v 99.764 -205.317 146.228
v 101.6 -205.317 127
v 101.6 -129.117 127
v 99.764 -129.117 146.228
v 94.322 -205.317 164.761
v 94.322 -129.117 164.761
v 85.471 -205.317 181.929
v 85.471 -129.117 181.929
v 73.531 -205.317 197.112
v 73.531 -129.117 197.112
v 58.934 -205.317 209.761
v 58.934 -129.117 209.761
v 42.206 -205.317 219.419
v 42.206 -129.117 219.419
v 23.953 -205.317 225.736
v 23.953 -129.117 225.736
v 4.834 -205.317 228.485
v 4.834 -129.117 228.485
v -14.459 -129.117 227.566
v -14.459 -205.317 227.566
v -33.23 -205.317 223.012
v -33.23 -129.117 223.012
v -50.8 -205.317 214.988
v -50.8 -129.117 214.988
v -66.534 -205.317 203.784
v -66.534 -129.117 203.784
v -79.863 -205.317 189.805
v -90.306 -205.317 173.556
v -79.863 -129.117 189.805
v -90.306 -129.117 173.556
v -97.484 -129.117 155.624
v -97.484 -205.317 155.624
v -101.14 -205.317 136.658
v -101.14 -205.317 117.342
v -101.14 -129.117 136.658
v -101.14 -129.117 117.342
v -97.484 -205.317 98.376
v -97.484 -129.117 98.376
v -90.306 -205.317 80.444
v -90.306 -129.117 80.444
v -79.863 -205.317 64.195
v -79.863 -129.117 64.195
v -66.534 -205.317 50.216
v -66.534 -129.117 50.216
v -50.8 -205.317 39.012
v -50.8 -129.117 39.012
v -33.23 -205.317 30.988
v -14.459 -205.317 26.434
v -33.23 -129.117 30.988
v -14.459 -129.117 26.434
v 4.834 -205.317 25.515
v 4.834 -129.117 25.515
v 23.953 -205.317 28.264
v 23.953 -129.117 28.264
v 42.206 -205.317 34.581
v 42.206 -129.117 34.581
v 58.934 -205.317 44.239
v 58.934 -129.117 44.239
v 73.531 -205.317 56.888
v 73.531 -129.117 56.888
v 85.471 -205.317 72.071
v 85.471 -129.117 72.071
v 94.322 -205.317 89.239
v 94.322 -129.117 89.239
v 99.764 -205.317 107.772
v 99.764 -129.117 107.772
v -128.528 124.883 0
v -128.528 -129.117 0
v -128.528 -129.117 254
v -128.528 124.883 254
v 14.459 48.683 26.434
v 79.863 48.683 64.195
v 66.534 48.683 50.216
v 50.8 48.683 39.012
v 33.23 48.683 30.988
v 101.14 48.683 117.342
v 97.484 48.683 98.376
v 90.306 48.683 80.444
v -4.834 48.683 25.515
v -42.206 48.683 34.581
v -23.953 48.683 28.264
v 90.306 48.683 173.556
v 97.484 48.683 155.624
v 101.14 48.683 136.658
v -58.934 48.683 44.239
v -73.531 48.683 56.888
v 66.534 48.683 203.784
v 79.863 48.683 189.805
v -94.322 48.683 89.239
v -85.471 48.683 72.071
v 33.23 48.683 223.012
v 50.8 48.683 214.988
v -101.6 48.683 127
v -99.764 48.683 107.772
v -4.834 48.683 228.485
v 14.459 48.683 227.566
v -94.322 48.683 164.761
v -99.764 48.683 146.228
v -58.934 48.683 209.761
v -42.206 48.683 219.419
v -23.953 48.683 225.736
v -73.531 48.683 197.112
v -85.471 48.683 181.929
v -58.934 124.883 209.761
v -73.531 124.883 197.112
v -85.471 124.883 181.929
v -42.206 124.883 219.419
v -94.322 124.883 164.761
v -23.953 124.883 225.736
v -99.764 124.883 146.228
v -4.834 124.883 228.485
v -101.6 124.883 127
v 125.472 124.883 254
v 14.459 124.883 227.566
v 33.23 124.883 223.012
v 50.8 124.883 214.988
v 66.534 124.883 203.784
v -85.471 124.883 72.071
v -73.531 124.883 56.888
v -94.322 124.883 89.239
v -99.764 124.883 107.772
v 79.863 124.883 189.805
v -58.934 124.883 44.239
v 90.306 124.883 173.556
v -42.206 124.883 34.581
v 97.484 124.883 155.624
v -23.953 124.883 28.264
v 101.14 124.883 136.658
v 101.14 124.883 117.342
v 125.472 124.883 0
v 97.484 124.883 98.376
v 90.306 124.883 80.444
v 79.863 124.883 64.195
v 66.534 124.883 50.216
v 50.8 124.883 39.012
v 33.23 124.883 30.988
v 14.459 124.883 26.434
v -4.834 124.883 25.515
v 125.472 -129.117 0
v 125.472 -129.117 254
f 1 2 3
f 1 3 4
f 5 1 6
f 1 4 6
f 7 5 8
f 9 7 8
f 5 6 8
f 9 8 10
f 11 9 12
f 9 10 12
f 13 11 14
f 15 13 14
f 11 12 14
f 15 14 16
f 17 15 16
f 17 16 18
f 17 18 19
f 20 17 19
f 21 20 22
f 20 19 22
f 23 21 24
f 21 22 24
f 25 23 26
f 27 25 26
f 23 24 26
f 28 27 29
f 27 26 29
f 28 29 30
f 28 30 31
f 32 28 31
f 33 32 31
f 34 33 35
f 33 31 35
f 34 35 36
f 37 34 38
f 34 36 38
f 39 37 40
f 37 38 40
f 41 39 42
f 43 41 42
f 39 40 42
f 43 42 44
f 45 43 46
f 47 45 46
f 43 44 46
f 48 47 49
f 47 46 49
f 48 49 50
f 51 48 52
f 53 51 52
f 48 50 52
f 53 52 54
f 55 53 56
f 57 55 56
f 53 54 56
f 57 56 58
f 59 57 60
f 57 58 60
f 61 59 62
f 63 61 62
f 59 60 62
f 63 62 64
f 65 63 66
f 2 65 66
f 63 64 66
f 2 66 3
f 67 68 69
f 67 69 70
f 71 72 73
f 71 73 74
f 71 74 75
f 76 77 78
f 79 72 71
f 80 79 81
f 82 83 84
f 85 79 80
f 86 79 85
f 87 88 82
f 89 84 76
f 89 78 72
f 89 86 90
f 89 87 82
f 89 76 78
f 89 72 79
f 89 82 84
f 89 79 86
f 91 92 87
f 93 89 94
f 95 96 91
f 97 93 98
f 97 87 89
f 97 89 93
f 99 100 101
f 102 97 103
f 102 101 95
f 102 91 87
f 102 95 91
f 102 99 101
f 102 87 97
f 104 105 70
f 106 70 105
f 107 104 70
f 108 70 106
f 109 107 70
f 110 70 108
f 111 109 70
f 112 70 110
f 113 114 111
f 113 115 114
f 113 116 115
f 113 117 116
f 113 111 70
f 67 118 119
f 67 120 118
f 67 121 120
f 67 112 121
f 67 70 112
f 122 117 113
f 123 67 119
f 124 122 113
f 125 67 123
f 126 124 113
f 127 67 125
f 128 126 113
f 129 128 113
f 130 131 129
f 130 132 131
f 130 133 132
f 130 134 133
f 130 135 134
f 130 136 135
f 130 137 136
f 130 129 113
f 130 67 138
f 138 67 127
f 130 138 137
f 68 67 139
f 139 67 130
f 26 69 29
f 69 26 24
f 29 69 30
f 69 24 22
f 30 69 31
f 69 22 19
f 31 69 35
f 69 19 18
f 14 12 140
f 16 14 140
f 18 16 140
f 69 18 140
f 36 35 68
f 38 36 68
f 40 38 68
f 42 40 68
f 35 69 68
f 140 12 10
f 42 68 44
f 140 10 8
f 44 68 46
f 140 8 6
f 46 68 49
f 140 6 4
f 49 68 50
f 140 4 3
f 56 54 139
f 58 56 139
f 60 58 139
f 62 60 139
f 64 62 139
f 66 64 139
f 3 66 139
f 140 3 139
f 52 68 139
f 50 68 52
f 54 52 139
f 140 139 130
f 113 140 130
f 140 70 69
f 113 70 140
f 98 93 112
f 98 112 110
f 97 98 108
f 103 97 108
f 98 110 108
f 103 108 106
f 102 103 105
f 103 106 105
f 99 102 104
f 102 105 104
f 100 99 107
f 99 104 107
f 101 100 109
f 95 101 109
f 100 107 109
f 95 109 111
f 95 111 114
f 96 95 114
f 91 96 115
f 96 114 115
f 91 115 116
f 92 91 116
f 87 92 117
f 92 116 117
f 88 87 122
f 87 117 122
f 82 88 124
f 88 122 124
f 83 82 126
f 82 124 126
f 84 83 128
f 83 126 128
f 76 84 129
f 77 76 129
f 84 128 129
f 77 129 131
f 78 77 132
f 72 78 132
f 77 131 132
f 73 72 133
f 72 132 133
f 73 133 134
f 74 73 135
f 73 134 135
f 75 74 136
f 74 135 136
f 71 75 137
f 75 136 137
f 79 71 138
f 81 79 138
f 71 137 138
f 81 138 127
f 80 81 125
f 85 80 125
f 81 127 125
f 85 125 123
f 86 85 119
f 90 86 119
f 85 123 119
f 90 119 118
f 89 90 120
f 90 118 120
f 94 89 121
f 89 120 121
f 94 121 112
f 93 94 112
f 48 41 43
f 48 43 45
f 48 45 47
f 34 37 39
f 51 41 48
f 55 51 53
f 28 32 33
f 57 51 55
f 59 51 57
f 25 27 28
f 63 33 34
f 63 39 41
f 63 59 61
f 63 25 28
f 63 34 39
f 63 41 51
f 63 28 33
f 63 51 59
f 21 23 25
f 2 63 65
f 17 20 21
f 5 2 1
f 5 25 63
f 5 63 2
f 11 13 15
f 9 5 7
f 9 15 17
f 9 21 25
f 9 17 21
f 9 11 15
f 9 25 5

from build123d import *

# Parameters (mm, degrees)
F0_W     = 254
F0_H     = 254
F1_DEPTH = 254
F2_R     = 101.6
F3_DEPTH = 76.2
F4_R     = 101.6
F5_DEPTH = 76.2


with BuildPart() as f1:
    # F0 (on Top) → F1 (new body)
    with BuildSketch(Plane.XY):
        with Locations((-1.528222, -2.116666)):
            Rectangle(F0_W, F0_H)
    extrude(amount=F1_DEPTH)

    # F2 (on face) → F3 (join)
    with BuildSketch(Plane.XZ.offset(129.116666)):
        with Locations((0, 127)):
            Circle(F2_R)
    extrude(amount=F3_DEPTH)

    # F4 (on face) → F5 (cut)
    with BuildSketch(Plane(origin=(0, 124.883334, 0), x_dir=(-1, 0, 0), z_dir=(0, 1, 0))):
        with Locations((0, 127)):
            Circle(F4_R)
    extrude(amount=-F5_DEPTH, mode=Mode.SUBTRACT)


solid = f1.part
